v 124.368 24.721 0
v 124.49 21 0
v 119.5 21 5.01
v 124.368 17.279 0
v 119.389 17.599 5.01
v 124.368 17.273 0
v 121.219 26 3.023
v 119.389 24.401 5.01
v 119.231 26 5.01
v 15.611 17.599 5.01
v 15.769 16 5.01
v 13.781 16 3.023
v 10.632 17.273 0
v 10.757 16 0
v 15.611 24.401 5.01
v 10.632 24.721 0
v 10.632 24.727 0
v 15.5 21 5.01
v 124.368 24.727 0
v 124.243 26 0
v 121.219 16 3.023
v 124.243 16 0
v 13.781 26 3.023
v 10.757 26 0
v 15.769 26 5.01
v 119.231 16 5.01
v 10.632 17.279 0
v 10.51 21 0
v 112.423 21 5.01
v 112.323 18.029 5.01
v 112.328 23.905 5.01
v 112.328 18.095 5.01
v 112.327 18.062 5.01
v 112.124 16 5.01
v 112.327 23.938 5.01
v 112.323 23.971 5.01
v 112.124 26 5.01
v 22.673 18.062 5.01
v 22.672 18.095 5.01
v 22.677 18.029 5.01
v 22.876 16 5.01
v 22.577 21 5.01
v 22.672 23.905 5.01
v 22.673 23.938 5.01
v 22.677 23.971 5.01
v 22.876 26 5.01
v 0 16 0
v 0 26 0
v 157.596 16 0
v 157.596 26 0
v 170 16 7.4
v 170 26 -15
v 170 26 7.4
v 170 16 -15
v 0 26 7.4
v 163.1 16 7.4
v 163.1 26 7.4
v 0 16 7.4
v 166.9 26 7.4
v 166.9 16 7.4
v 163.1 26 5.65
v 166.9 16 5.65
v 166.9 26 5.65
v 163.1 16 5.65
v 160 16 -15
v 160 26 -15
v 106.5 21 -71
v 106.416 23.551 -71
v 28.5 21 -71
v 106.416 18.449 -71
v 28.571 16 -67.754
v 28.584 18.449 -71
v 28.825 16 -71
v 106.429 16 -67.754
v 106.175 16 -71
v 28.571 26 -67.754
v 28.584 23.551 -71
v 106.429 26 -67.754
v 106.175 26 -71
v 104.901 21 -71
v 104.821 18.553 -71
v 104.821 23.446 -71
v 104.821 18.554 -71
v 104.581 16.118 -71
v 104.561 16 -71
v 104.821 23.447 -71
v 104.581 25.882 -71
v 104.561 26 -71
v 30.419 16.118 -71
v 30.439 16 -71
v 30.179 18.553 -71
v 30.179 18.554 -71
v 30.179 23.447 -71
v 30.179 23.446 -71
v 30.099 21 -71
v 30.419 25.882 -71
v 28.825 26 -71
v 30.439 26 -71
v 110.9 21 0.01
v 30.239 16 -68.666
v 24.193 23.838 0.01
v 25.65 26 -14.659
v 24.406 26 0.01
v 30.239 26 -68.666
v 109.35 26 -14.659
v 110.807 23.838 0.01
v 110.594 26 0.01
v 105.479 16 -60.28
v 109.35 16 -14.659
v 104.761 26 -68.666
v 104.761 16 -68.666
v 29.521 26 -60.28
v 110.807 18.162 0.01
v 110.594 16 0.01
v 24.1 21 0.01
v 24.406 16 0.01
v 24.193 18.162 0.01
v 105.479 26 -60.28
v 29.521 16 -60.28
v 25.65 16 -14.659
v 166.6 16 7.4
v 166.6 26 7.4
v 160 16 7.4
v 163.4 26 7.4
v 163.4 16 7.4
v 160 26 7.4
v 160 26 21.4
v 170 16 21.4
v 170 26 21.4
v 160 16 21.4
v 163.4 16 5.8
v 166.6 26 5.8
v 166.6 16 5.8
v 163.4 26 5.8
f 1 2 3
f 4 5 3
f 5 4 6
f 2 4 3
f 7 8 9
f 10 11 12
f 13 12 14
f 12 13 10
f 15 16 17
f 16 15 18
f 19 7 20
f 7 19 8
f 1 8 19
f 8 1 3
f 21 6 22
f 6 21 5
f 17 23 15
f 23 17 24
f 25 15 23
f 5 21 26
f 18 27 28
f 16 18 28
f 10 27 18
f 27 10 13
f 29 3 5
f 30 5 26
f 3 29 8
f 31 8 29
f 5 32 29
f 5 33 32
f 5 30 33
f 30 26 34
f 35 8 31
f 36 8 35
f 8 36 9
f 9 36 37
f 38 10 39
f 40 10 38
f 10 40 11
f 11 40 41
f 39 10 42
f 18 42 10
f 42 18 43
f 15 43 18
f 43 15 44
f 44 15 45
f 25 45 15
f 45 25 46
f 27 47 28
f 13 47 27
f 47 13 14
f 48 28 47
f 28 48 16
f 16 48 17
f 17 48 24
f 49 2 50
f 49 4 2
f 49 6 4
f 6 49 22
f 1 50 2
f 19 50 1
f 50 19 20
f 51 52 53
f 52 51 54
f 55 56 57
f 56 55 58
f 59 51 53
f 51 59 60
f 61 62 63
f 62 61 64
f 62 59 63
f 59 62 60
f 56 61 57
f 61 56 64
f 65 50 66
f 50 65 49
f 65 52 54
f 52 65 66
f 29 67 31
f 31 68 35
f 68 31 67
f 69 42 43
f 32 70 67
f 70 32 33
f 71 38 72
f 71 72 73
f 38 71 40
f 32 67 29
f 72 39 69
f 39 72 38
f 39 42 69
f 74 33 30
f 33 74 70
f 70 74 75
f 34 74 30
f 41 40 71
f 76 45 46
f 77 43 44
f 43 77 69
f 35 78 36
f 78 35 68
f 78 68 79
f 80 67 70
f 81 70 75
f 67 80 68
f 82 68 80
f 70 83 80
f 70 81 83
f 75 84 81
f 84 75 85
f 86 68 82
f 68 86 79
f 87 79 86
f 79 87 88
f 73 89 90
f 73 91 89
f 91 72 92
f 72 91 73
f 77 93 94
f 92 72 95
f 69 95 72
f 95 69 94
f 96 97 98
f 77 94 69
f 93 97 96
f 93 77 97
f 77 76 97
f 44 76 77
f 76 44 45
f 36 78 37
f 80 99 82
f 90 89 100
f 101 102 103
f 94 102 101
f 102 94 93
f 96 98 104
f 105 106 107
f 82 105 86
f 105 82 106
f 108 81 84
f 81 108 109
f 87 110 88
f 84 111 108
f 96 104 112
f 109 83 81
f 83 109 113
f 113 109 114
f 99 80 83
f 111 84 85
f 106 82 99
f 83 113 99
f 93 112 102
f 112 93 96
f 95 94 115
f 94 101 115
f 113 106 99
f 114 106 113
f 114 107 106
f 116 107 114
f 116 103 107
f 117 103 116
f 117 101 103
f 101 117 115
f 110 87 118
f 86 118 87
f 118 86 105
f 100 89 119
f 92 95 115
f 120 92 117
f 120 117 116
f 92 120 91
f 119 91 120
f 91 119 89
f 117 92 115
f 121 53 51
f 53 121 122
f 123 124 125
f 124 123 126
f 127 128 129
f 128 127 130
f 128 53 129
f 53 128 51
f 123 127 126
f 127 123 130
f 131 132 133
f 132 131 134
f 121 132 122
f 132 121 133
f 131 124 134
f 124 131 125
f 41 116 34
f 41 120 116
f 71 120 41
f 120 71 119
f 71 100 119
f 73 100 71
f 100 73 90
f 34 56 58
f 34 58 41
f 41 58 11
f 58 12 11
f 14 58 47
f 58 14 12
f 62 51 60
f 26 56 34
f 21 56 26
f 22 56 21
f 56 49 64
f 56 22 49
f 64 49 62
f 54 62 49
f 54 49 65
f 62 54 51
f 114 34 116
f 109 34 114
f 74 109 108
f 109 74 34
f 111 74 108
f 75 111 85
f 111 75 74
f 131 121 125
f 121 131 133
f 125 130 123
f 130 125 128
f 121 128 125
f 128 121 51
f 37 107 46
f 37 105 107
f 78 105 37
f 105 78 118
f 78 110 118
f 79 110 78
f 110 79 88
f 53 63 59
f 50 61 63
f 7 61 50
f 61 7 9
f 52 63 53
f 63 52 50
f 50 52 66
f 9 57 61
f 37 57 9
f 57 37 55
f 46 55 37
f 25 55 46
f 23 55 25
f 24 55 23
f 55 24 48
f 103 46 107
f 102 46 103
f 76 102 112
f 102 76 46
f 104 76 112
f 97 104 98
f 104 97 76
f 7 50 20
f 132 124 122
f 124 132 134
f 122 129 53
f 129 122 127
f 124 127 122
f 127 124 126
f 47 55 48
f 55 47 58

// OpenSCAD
// file: ../../lib/project/util.scad
// lib/project/util.scad

module rounded_rect_2d(size = [10, 10], r = 2) {
  x = size[0];
  y = size[1];
  rr = min(r, min(x, y) / 2);

  hull() {
    for (sx = [-1, 1], sy = [-1, 1]) {
      translate([sx * (x / 2 - rr), sy * (y / 2 - rr)])
        circle(r = rr);
    }
  }
}
// file: ../../lib/project/params.scad
// lib/project/params.scad
// Shared project parameters for the final tray and all fit-test models.

debug = false;

// Main tray footprint.
tray_corner_r = 15;

// Top tray shell.
tray_floor_t = 2.4;
tray_wall_h = 14;
top_wall_w = 10;
glue_rabbet_h = 1.6;
glue_rabbet_w = 3.2;
glue_rabbet_side_clearance = 0.3;
glue_rabbet_vertical_clearance = 0.5;

// Underside support lip and rear support section.
support_lip_drop = 15;
support_lip_w = 10;
front_lip_forward_shift = 2;
front_lip_back_extra = 5;
front_lip_bottom_back_extra = 0;
side_lip_inner_extra = 2.5;
side_lip_bottom_inner_extra = 0;
console_clear_w = 320;
side_lip_run = 170;
tray_w = console_clear_w + 2 * support_lip_w;
tray_d = side_lip_run + support_lip_w;
front_extension = 35;
rear_gap_w = 28;
rear_tongue_side_margin = 20;
rear_tongue_w = tray_w - 2 * rear_tongue_side_margin;
rear_tongue_depth = 34;
rear_tongue_t = 4.0;

// Cup holder location and plug geometry.
cup_spacing = 135;
// Confirmed from fit checks: move plugs 39 mm rearward from the prior position.
cup_y_from_front = 111;
plug_top_d = 90;
plug_bottom_d = 78;
plug_h = 71;
plug_shell_t = 1.6;
plug_clearance_z = 0;
cup_rim_w = 7;
cup_rim_h = 5;

// Optional underside splice plate for joining printed tray halves.
splice_plate_enable = true;
splice_plate_w = 120;
splice_plate_d = 18;
splice_plate_t = 2;
splice_plate_corner_r = 3;
splice_plate_y_from_front = 40;
splice_plate_side_clearance = 0.3;
splice_plate_vertical_clearance = 0.5;
rear_splice_plate_enable = true;
rear_splice_plate_y_from_front = 184;

// Fit-test defaults.
test_plug_top_ds = [84, 85, 86];
test_spacing_values = [116, 118, 120];
test_lip_drop_values = [8, 10, 12];
test_rear_tongue_ts = [1.4, 1.8, 2.2];
test_frame_wall_w = 12;
test_front_zone_depth = 100;
test_rear_zone_depth = 56;
test_gap_section_w = 140;
test_coupon_spacing = 18;
test_front_to_back_slice_w = 10;
test_side_to_side_slice_w = 10;
test_rabbet_corner_section_size = 56;
test_rabbet_coupon_gap = 16;
test_rabbet_body_margin_from_groove = 15;
// main file
use <../../lib/project/console_tray.scad>;
include <../../lib/project/params.scad>;

// Print one half, then mirror it in the slicer or by setting mirror_part = true
// for the matching opposite side.
mirror_part = false;

half_cup_plug_side_to_side_slice_variant(
  tray_w = tray_w,
  tray_d = tray_d,
  front_extension = front_extension,
  tray_corner_r = tray_corner_r,
  tray_floor_t = tray_floor_t,
  tray_wall_h = tray_wall_h,
  top_wall_w = top_wall_w,
  support_lip_drop = support_lip_drop,
  support_lip_w = support_lip_w,
  front_lip_forward_shift = front_lip_forward_shift,
  front_lip_back_extra = front_lip_back_extra,
  front_lip_bottom_back_extra = front_lip_bottom_back_extra,
  side_lip_inner_extra = side_lip_inner_extra,
  side_lip_bottom_inner_extra = side_lip_bottom_inner_extra,
  rear_gap_w = rear_gap_w,
  rear_tongue_w = rear_tongue_w,
  rear_tongue_depth = rear_tongue_depth,
  rear_tongue_t = rear_tongue_t,
  cup_spacing = cup_spacing,
  cup_y_from_front = cup_y_from_front,
  plug_top_d = plug_top_d,
  plug_bottom_d = plug_bottom_d,
  plug_h = plug_h,
  plug_shell_t = plug_shell_t,
  cup_rim_w = cup_rim_w,
  cup_rim_h = cup_rim_h,
  slice_w = test_side_to_side_slice_w,
  mirror_x = mirror_part
);
